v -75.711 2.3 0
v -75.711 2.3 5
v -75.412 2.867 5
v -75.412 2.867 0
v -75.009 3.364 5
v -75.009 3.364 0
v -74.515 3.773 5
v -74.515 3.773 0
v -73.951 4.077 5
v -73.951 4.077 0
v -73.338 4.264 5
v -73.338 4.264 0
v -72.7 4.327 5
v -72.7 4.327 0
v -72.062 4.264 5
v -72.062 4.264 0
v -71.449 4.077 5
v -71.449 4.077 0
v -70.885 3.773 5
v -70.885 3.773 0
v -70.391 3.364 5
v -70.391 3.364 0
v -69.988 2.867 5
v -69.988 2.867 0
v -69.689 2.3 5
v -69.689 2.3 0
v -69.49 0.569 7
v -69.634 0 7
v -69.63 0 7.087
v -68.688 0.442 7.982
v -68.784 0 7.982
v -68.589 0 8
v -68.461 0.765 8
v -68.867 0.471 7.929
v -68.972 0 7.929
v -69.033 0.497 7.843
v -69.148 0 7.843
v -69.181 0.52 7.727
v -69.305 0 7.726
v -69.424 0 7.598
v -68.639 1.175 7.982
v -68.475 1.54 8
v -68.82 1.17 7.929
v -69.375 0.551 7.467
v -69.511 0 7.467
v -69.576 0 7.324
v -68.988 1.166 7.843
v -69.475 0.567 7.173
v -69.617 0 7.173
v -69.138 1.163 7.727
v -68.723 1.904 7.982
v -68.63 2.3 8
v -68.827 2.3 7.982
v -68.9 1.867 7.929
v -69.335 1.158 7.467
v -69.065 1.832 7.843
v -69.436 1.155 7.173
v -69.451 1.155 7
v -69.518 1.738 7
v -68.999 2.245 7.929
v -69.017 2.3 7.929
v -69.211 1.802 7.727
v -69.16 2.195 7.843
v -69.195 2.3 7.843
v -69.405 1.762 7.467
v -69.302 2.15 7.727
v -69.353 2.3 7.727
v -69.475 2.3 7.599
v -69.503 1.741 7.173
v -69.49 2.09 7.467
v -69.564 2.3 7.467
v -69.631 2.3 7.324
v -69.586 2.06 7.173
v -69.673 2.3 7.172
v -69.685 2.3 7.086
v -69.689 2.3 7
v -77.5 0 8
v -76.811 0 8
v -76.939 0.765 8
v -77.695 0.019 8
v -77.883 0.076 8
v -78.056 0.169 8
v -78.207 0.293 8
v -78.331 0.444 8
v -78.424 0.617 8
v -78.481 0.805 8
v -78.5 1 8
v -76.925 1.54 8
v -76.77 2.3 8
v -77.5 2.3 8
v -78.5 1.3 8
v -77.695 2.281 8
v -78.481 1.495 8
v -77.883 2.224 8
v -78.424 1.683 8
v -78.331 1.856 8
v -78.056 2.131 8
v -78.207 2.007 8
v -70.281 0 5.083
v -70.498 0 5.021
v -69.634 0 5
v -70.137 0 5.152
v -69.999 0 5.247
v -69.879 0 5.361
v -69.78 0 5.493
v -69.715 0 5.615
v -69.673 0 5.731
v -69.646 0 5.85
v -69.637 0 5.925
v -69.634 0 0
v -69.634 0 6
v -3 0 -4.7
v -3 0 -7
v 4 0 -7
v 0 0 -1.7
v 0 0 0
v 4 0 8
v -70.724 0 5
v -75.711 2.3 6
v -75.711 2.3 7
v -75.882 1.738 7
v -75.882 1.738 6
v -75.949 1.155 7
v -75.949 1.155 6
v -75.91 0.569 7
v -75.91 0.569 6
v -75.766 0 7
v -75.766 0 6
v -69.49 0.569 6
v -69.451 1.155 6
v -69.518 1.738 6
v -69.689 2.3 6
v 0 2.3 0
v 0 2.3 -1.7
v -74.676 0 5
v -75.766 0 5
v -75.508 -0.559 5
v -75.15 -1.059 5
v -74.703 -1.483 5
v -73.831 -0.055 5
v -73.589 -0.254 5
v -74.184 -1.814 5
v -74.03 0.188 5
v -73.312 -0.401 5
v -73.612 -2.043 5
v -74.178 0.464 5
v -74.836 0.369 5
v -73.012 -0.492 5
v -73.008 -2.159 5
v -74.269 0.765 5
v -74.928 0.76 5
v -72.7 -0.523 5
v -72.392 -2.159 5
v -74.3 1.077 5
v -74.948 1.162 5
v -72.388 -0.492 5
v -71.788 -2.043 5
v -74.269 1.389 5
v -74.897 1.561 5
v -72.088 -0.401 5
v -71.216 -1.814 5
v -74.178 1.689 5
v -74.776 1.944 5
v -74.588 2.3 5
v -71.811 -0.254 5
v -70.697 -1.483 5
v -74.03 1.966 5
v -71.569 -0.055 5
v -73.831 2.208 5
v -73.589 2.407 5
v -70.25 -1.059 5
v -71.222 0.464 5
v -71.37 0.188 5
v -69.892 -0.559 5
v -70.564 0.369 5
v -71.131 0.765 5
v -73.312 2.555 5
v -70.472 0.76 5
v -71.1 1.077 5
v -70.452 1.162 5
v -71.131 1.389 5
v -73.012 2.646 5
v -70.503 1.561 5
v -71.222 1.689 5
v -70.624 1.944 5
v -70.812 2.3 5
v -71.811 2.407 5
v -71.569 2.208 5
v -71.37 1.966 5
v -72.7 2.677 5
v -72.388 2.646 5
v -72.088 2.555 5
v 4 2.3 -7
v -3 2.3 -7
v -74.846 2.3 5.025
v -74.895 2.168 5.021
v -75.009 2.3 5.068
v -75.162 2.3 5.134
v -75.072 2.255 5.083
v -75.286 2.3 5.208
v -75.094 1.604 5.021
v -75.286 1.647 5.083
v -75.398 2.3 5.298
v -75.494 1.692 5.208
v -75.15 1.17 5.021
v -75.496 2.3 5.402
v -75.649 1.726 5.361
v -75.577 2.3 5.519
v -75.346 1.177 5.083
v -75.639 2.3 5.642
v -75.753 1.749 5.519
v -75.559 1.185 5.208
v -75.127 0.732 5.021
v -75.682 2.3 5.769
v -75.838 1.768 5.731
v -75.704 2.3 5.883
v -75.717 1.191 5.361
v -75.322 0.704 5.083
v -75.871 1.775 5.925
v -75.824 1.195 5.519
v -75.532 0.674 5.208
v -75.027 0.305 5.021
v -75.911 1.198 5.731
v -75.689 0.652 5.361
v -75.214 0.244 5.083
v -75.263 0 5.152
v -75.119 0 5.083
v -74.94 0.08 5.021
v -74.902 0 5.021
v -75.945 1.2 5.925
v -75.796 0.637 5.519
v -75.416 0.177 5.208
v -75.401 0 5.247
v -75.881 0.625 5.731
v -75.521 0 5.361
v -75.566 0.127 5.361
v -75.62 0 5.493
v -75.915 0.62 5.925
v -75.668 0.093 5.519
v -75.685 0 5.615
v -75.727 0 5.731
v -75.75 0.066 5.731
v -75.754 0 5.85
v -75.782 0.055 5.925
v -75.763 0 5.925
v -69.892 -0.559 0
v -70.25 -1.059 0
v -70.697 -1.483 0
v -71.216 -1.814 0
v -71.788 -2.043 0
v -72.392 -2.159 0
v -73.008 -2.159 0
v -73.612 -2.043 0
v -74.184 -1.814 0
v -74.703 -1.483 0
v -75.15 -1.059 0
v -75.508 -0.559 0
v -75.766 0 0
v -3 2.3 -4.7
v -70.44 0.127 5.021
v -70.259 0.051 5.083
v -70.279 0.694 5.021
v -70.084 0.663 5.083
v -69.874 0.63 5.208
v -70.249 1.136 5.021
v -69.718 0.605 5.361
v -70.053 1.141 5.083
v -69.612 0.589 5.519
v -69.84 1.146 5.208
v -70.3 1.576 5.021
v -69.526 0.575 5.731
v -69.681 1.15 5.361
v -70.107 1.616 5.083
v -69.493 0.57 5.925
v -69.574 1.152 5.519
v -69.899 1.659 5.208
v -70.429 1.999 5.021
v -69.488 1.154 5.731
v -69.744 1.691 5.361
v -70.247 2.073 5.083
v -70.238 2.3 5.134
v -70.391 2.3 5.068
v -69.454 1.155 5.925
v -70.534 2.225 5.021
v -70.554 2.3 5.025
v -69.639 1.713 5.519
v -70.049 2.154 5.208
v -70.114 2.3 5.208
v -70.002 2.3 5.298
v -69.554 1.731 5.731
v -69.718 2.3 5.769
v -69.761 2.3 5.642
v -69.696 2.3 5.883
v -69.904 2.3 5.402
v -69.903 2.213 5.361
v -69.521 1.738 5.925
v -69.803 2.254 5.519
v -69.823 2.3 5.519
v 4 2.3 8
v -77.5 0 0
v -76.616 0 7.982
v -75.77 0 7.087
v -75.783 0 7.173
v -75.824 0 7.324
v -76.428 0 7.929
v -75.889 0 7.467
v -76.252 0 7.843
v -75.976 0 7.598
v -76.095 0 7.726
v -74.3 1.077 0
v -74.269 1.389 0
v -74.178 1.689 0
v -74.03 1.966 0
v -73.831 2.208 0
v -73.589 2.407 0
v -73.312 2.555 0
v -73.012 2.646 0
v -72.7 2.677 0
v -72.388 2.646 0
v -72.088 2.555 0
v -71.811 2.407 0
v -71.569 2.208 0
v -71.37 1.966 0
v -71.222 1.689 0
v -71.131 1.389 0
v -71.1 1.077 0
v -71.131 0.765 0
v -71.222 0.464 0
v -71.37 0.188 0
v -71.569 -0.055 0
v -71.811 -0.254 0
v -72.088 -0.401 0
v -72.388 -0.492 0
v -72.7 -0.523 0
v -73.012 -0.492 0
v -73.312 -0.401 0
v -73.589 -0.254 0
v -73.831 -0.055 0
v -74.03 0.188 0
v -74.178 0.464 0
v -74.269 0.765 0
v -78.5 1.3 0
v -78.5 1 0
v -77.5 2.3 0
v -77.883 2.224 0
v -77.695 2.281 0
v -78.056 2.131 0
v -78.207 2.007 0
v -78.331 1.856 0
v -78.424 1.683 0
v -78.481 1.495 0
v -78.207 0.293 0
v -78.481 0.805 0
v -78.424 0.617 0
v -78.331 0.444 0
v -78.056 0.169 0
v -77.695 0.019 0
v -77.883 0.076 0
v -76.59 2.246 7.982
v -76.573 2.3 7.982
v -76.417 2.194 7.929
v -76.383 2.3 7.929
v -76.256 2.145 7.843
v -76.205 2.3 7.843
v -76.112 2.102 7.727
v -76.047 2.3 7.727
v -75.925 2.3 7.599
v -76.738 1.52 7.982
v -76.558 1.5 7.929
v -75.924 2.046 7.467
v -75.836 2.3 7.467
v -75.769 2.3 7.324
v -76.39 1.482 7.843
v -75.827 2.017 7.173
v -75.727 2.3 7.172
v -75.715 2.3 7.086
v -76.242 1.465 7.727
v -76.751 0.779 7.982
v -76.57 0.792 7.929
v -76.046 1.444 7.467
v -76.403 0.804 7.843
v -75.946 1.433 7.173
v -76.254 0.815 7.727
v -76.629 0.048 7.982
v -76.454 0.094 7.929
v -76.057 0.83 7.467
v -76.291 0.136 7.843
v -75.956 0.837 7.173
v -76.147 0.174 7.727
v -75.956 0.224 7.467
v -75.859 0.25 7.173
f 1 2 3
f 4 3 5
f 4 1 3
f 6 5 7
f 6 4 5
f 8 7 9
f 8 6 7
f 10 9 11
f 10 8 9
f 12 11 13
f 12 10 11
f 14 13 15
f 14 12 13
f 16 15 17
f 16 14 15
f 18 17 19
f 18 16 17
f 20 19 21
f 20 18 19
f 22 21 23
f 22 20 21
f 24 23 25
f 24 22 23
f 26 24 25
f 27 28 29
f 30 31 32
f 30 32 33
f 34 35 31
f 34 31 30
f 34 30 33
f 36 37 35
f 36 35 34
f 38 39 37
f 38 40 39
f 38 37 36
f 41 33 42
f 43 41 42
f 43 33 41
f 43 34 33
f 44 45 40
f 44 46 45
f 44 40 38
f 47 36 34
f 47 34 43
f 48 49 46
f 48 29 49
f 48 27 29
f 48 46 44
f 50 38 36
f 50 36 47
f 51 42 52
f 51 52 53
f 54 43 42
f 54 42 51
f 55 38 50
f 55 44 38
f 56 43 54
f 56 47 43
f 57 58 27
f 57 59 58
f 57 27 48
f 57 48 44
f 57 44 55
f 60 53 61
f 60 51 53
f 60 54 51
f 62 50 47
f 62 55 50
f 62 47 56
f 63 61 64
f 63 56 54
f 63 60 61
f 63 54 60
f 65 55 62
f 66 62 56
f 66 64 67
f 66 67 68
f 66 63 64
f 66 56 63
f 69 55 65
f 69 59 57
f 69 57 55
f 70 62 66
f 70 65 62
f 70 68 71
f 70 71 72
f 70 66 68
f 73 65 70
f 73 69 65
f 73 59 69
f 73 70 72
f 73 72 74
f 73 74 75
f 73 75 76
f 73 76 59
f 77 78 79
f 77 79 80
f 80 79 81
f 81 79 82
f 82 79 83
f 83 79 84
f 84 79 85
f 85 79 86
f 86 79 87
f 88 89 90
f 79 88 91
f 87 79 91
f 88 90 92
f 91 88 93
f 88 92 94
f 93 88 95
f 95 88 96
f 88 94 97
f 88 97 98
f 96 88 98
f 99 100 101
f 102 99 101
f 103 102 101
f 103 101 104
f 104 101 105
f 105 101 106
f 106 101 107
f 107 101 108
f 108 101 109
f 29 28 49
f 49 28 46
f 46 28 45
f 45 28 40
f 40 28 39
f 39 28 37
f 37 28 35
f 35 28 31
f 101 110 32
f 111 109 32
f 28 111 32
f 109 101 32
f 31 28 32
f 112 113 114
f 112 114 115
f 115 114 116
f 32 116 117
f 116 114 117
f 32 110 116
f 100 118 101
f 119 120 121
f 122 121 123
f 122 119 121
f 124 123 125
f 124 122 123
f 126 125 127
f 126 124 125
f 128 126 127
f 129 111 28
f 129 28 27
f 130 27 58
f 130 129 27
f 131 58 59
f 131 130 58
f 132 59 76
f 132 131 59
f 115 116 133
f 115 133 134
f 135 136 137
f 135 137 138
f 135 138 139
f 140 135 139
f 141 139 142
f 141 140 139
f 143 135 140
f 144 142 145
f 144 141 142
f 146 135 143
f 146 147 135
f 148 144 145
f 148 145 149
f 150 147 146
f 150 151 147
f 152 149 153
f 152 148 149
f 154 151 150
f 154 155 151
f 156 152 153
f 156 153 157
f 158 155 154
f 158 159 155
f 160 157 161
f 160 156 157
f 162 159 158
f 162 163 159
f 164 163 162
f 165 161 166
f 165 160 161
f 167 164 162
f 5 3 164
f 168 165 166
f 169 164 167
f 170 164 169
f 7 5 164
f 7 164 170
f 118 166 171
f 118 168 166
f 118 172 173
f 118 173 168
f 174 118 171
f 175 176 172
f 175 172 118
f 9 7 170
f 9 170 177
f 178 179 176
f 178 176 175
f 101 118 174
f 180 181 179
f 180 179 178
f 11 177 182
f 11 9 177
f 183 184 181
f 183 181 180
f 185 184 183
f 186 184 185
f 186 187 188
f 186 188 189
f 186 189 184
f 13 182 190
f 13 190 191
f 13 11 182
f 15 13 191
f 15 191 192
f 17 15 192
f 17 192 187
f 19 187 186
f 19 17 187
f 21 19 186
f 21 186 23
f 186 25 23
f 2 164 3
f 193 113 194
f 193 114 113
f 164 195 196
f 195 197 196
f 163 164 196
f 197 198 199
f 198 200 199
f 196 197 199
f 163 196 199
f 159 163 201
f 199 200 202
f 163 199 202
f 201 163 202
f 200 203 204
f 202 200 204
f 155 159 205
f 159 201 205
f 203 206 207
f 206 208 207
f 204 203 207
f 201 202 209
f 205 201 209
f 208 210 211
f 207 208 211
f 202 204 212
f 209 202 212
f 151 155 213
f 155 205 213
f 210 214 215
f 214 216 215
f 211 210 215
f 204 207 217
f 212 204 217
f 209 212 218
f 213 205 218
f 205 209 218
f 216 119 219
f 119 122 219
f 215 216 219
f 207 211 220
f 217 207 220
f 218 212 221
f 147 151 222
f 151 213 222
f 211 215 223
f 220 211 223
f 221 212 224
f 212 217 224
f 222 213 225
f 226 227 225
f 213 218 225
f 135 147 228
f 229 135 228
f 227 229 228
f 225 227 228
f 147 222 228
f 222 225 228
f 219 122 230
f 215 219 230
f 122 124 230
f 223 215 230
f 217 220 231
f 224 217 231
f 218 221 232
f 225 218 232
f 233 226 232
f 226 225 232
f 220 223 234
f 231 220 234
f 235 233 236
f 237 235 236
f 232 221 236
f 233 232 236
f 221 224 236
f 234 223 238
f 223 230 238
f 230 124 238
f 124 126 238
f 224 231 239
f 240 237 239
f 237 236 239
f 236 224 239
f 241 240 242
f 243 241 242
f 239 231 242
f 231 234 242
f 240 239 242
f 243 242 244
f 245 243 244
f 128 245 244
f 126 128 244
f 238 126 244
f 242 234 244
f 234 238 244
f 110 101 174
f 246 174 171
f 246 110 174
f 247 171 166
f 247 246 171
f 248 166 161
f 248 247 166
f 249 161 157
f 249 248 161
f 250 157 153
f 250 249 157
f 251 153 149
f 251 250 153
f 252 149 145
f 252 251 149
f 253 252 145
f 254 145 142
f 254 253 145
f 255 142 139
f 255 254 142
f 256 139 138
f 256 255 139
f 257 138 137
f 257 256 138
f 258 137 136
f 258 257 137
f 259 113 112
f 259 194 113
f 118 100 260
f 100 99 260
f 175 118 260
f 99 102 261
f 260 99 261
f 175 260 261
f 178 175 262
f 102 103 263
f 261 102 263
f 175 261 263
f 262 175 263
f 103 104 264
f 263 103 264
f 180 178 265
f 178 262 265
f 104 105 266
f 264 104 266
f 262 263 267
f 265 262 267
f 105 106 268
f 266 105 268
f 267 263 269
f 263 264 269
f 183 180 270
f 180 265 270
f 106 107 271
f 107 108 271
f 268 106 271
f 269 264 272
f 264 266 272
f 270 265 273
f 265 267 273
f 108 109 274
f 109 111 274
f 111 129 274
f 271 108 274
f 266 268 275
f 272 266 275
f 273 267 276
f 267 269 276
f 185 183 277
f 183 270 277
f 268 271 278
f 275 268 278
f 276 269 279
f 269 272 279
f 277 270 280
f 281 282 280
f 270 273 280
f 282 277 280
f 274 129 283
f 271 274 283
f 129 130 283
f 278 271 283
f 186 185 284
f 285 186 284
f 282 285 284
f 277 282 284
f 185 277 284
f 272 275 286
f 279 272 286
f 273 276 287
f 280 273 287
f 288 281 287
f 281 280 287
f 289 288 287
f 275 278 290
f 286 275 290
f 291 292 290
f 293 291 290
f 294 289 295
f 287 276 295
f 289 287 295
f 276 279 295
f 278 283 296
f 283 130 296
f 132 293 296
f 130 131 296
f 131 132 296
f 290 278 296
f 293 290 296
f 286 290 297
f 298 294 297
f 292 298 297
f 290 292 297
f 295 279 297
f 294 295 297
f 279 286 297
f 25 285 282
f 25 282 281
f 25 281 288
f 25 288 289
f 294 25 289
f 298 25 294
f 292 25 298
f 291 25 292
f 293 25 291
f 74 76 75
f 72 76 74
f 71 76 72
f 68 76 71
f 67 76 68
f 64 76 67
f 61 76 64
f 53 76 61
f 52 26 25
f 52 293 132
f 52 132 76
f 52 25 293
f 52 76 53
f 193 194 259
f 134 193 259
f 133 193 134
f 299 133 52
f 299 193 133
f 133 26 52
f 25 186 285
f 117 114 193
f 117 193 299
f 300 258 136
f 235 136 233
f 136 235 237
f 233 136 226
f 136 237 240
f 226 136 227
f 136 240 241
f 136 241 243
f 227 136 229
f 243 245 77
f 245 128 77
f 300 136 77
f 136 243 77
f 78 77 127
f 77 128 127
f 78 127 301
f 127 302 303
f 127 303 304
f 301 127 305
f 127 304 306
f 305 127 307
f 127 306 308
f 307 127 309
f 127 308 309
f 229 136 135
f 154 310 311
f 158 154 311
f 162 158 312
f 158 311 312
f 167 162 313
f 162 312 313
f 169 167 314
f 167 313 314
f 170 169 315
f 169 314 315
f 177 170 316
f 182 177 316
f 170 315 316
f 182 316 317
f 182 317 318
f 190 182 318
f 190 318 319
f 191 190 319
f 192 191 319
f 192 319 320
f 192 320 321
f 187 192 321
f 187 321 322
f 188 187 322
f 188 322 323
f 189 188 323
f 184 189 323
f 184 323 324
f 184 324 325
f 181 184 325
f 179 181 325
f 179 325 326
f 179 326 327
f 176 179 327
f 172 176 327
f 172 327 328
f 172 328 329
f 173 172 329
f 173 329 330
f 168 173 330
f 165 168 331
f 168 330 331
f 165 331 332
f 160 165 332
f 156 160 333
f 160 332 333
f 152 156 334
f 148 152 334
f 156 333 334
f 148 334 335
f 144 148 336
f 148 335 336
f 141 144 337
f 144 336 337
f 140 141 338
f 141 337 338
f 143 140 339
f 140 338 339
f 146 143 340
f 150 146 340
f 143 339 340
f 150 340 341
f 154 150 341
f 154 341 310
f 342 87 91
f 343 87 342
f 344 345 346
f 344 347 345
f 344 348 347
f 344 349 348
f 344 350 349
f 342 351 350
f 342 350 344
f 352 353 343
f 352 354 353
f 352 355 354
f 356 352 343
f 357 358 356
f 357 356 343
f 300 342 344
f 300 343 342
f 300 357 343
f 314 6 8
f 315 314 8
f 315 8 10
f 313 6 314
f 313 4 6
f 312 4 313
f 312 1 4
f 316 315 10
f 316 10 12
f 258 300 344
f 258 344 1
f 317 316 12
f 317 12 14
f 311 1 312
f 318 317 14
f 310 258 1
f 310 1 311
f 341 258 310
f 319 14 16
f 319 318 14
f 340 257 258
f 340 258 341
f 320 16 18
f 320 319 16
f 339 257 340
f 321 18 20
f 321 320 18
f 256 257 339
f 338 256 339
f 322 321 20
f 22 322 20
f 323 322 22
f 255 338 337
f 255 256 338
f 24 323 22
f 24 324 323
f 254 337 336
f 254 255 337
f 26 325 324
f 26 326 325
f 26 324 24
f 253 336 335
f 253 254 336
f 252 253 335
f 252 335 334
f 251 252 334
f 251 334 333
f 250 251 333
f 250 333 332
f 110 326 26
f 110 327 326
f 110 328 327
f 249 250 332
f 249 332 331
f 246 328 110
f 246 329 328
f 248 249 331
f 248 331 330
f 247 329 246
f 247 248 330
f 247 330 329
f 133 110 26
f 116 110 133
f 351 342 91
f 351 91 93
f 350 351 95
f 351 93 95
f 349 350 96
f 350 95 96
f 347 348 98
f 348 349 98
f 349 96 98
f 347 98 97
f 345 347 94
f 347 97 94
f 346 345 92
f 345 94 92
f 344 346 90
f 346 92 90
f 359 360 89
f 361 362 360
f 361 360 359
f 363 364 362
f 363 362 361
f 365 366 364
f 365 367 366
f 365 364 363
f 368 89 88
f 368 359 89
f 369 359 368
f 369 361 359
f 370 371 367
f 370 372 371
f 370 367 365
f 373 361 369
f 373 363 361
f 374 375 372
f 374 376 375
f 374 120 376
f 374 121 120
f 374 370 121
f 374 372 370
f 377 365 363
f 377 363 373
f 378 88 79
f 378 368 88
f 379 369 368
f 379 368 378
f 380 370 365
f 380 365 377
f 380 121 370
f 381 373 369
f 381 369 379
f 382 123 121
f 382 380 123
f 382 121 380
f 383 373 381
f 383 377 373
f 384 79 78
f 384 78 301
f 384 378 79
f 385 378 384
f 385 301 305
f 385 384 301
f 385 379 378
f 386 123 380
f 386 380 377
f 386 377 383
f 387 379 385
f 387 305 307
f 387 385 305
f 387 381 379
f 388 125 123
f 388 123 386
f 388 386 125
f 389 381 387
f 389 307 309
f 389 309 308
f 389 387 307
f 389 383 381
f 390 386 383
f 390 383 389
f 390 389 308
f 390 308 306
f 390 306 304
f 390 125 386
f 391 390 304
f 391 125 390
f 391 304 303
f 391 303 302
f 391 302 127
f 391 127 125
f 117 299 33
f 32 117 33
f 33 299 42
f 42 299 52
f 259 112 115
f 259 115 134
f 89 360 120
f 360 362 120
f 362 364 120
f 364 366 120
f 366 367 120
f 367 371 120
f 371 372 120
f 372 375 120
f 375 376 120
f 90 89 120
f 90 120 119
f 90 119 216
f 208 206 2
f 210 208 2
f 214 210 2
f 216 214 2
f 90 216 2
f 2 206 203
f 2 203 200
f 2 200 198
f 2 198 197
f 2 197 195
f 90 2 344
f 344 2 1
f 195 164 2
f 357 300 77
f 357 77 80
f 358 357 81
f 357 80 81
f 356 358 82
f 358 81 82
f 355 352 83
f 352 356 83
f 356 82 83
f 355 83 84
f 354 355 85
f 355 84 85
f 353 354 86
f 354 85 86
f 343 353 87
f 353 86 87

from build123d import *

# Parameters (mm, degrees)
BOSS_EXTRUDE1_DEPTH = 2.3
SKETCH2_R           = 3.25
BOSS_EXTRUDE2_DEPTH = 8
SKETCH3_R           = 1.6
CUT_EXTRUDE1_DEPTH  = 8
CUT_EXTRUDE2_START  = -3
SKETCH4_R           = 3.25
CUT_EXTRUDE2_DEPTH  = 3
FILLET1_R           = 1
SKETCH5_W           = 5.3
SKETCH5_H           = 2.3
BOSS_EXTRUDE3_DEPTH = 3
CHAMFER1_SIZE       = 3


# Some blends are built 0.0001 mm under size
with BuildPart() as part:
    # Sketch1 → Boss-Extrude1 (new body)
    with BuildSketch(Plane(origin=(0, 0, 0), x_dir=(1, 0, 0), z_dir=(0, 1, 0))):
        Polygon((-78.5, 0), (0, 0), (0, 7), (4, 7), (4, -8), (-78.5, -8), align=None)
    extrude(amount=BOSS_EXTRUDE1_DEPTH)

    # Sketch2 → Boss-Extrude2 (add)
    with BuildSketch(Plane(origin=(0, 0, 0), x_dir=(-1, 0, 0), z_dir=(0, 0, -1))):
        with Locations((72.7, 1.076790216)):
            Circle(SKETCH2_R)
    extrude(amount=-BOSS_EXTRUDE2_DEPTH)

    # Sketch3 → Cut-Extrude1 (cut)
    with BuildSketch(Plane(origin=(0, 0, 0), x_dir=(-1, 0, 0), z_dir=(0, 0, -1))):
        with Locations((72.7, 1.076790216)):
            Circle(SKETCH3_R)
    extrude(amount=-CUT_EXTRUDE1_DEPTH, mode=Mode.SUBTRACT)

    # Sketch4 → Cut-Extrude2 (cut)
    with BuildSketch(Plane.XY.offset(8).offset(CUT_EXTRUDE2_START)):
        with Locations((-72.7, 1.076790216)):
            Circle(SKETCH4_R)
    extrude(amount=CUT_EXTRUDE2_DEPTH, mode=Mode.SUBTRACT)

    # Fillet1
    # the kernel refuses this fillet: 1 mm, written as the material it adds along each edge
    with BuildSketch(Plane(origin=(-72.7, 1.076790216, 5), x_dir=(-0.40375953104752016, 0.9148651491276113, 0), z_dir=(0.9148651491276113, 0.40375953104752016, 0))) as fillet1_piece_1_section:
        with BuildLine():
            CenterArc((3.25 - FILLET1_R, FILLET1_R), FILLET1_R, 270, 90)
            Line((3.25, FILLET1_R), (3.25, 0))
            Line((3.25, 0), (3.25 - FILLET1_R, 0))
        make_face()
    fillet1_piece_1 = revolve(axis=Axis((-72.7, 1.076790216, 5), (0, 0, 1)), revolution_arc=129.612934005, mode=Mode.PRIVATE)
    fillet1_piece_1 = split(fillet1_piece_1, bisect_by=Plane(origin=(-75.648358943, 2.3, 5.222958047), z_dir=(0, -1, 0)), keep=Keep.TOP, mode=Mode.PRIVATE)
    fillet1_piece_1 = split(fillet1_piece_1, bisect_by=Plane(origin=(-75.648358943, 0, 5.222958047), z_dir=(0, 1, 0)), keep=Keep.TOP, mode=Mode.PRIVATE)
    add(fillet1_piece_1)
    with BuildSketch(Plane(origin=(-72.7, 1.076790216, 5), x_dir=(0.44734781927350936, -0.8943600665231177, 0), z_dir=(-0.8943600665231177, -0.44734781927350936, 0))) as fillet1_piece_2_section:
        with BuildLine():
            CenterArc((3.25 - FILLET1_R, FILLET1_R), FILLET1_R, 270, 90)
            Line((3.25, FILLET1_R), (3.25, 0))
            Line((3.25, 0), (3.25 - FILLET1_R, 0))
        make_face()
    fillet1_piece_2 = revolve(axis=Axis((-72.7, 1.076790216, 5), (0, 0, 1)), revolution_arc=129.612934005, mode=Mode.PRIVATE)
    fillet1_piece_2 = split(fillet1_piece_2, bisect_by=Plane(origin=(-69.751641159, 2.3, 5.222958106), z_dir=(0, -1, 0)), keep=Keep.TOP, mode=Mode.PRIVATE)
    fillet1_piece_2 = split(fillet1_piece_2, bisect_by=Plane(origin=(-69.751641159, 0, 5.222958106), z_dir=(0, 1, 0)), keep=Keep.TOP, mode=Mode.PRIVATE)
    add(fillet1_piece_2)
    # the kernel refuses this fillet: 1 mm, written as the material it takes off along each edge
    with BuildSketch(Plane(origin=(-78.5, 2.3, 10.5), x_dir=(0, -1, 0), z_dir=(0, 0, -1)), Plane(origin=(-78.5, 0, 10.5), x_dir=(1, 0, 0), z_dir=(0, 0, -1))) as fillet1_2_piece_1:
        with BuildLine():
            CenterArc((FILLET1_R, -FILLET1_R), FILLET1_R, 90, 90)
            Line((0, -FILLET1_R), (0, 0))
            Line((0, 0), (FILLET1_R, 0))
        make_face()
    extrude(amount=13, mode=Mode.SUBTRACT)
    with BuildSketch(Plane(origin=(-72.7, 1.076790216, 8), x_dir=(-0.40375953104750745, 0.914865149127617, 0), z_dir=(0.914865149127617, 0.40375953104750745, 0))) as fillet1_2_piece_2:
        with BuildLine():
            CenterArc((3.25 + FILLET1_R, -FILLET1_R), FILLET1_R, 90, 90)
            Line((3.25, -FILLET1_R), (3.25, 0))
            Line((3.25, 0), (3.25 + FILLET1_R, 0))
        make_face()
    revolve(axis=Axis((-72.7, 1.076790216, 8), (0, 0, 1)), revolution_arc=129.612934005, mode=Mode.SUBTRACT)
    with BuildSketch(Plane(origin=(-72.7, 1.076790216, 8), x_dir=(0.44734781927345224, -0.8943600665231464, 7.1054273576009774e-15), z_dir=(-0.8943600665231464, -0.44734781927345224, 3.689898674328445e-15))) as fillet1_2_piece_3:
        with BuildLine():
            CenterArc((3.25 + FILLET1_R, -FILLET1_R), FILLET1_R, 90, 90)
            Line((3.25 + FILLET1_R, 0), (3.25, 0))
            Line((3.25, 0), (3.25, -FILLET1_R))
        make_face()
    revolve(axis=Axis((-72.7, 1.076790216, 8), (0, 0, 1)), revolution_arc=129.612934005, mode=Mode.SUBTRACT)

    # Sketch5 → Boss-Extrude3 (add)
    with BuildSketch(Plane.ZY):
        with Locations((-4.35, 1.15)):
            Rectangle(SKETCH5_W, SKETCH5_H)
    extrude(amount=BOSS_EXTRUDE3_DEPTH)

    # Chamfer1
    chamfer1_edges = [part.edges().sort_by_distance(p)[0] for p in [
        (-3, 1.15, -1.7),
    ]]
    chamfer(chamfer1_edges, length=CHAMFER1_SIZE - 0.0001)  # a hair under: the kernel refuses the full size


solid = part.part
